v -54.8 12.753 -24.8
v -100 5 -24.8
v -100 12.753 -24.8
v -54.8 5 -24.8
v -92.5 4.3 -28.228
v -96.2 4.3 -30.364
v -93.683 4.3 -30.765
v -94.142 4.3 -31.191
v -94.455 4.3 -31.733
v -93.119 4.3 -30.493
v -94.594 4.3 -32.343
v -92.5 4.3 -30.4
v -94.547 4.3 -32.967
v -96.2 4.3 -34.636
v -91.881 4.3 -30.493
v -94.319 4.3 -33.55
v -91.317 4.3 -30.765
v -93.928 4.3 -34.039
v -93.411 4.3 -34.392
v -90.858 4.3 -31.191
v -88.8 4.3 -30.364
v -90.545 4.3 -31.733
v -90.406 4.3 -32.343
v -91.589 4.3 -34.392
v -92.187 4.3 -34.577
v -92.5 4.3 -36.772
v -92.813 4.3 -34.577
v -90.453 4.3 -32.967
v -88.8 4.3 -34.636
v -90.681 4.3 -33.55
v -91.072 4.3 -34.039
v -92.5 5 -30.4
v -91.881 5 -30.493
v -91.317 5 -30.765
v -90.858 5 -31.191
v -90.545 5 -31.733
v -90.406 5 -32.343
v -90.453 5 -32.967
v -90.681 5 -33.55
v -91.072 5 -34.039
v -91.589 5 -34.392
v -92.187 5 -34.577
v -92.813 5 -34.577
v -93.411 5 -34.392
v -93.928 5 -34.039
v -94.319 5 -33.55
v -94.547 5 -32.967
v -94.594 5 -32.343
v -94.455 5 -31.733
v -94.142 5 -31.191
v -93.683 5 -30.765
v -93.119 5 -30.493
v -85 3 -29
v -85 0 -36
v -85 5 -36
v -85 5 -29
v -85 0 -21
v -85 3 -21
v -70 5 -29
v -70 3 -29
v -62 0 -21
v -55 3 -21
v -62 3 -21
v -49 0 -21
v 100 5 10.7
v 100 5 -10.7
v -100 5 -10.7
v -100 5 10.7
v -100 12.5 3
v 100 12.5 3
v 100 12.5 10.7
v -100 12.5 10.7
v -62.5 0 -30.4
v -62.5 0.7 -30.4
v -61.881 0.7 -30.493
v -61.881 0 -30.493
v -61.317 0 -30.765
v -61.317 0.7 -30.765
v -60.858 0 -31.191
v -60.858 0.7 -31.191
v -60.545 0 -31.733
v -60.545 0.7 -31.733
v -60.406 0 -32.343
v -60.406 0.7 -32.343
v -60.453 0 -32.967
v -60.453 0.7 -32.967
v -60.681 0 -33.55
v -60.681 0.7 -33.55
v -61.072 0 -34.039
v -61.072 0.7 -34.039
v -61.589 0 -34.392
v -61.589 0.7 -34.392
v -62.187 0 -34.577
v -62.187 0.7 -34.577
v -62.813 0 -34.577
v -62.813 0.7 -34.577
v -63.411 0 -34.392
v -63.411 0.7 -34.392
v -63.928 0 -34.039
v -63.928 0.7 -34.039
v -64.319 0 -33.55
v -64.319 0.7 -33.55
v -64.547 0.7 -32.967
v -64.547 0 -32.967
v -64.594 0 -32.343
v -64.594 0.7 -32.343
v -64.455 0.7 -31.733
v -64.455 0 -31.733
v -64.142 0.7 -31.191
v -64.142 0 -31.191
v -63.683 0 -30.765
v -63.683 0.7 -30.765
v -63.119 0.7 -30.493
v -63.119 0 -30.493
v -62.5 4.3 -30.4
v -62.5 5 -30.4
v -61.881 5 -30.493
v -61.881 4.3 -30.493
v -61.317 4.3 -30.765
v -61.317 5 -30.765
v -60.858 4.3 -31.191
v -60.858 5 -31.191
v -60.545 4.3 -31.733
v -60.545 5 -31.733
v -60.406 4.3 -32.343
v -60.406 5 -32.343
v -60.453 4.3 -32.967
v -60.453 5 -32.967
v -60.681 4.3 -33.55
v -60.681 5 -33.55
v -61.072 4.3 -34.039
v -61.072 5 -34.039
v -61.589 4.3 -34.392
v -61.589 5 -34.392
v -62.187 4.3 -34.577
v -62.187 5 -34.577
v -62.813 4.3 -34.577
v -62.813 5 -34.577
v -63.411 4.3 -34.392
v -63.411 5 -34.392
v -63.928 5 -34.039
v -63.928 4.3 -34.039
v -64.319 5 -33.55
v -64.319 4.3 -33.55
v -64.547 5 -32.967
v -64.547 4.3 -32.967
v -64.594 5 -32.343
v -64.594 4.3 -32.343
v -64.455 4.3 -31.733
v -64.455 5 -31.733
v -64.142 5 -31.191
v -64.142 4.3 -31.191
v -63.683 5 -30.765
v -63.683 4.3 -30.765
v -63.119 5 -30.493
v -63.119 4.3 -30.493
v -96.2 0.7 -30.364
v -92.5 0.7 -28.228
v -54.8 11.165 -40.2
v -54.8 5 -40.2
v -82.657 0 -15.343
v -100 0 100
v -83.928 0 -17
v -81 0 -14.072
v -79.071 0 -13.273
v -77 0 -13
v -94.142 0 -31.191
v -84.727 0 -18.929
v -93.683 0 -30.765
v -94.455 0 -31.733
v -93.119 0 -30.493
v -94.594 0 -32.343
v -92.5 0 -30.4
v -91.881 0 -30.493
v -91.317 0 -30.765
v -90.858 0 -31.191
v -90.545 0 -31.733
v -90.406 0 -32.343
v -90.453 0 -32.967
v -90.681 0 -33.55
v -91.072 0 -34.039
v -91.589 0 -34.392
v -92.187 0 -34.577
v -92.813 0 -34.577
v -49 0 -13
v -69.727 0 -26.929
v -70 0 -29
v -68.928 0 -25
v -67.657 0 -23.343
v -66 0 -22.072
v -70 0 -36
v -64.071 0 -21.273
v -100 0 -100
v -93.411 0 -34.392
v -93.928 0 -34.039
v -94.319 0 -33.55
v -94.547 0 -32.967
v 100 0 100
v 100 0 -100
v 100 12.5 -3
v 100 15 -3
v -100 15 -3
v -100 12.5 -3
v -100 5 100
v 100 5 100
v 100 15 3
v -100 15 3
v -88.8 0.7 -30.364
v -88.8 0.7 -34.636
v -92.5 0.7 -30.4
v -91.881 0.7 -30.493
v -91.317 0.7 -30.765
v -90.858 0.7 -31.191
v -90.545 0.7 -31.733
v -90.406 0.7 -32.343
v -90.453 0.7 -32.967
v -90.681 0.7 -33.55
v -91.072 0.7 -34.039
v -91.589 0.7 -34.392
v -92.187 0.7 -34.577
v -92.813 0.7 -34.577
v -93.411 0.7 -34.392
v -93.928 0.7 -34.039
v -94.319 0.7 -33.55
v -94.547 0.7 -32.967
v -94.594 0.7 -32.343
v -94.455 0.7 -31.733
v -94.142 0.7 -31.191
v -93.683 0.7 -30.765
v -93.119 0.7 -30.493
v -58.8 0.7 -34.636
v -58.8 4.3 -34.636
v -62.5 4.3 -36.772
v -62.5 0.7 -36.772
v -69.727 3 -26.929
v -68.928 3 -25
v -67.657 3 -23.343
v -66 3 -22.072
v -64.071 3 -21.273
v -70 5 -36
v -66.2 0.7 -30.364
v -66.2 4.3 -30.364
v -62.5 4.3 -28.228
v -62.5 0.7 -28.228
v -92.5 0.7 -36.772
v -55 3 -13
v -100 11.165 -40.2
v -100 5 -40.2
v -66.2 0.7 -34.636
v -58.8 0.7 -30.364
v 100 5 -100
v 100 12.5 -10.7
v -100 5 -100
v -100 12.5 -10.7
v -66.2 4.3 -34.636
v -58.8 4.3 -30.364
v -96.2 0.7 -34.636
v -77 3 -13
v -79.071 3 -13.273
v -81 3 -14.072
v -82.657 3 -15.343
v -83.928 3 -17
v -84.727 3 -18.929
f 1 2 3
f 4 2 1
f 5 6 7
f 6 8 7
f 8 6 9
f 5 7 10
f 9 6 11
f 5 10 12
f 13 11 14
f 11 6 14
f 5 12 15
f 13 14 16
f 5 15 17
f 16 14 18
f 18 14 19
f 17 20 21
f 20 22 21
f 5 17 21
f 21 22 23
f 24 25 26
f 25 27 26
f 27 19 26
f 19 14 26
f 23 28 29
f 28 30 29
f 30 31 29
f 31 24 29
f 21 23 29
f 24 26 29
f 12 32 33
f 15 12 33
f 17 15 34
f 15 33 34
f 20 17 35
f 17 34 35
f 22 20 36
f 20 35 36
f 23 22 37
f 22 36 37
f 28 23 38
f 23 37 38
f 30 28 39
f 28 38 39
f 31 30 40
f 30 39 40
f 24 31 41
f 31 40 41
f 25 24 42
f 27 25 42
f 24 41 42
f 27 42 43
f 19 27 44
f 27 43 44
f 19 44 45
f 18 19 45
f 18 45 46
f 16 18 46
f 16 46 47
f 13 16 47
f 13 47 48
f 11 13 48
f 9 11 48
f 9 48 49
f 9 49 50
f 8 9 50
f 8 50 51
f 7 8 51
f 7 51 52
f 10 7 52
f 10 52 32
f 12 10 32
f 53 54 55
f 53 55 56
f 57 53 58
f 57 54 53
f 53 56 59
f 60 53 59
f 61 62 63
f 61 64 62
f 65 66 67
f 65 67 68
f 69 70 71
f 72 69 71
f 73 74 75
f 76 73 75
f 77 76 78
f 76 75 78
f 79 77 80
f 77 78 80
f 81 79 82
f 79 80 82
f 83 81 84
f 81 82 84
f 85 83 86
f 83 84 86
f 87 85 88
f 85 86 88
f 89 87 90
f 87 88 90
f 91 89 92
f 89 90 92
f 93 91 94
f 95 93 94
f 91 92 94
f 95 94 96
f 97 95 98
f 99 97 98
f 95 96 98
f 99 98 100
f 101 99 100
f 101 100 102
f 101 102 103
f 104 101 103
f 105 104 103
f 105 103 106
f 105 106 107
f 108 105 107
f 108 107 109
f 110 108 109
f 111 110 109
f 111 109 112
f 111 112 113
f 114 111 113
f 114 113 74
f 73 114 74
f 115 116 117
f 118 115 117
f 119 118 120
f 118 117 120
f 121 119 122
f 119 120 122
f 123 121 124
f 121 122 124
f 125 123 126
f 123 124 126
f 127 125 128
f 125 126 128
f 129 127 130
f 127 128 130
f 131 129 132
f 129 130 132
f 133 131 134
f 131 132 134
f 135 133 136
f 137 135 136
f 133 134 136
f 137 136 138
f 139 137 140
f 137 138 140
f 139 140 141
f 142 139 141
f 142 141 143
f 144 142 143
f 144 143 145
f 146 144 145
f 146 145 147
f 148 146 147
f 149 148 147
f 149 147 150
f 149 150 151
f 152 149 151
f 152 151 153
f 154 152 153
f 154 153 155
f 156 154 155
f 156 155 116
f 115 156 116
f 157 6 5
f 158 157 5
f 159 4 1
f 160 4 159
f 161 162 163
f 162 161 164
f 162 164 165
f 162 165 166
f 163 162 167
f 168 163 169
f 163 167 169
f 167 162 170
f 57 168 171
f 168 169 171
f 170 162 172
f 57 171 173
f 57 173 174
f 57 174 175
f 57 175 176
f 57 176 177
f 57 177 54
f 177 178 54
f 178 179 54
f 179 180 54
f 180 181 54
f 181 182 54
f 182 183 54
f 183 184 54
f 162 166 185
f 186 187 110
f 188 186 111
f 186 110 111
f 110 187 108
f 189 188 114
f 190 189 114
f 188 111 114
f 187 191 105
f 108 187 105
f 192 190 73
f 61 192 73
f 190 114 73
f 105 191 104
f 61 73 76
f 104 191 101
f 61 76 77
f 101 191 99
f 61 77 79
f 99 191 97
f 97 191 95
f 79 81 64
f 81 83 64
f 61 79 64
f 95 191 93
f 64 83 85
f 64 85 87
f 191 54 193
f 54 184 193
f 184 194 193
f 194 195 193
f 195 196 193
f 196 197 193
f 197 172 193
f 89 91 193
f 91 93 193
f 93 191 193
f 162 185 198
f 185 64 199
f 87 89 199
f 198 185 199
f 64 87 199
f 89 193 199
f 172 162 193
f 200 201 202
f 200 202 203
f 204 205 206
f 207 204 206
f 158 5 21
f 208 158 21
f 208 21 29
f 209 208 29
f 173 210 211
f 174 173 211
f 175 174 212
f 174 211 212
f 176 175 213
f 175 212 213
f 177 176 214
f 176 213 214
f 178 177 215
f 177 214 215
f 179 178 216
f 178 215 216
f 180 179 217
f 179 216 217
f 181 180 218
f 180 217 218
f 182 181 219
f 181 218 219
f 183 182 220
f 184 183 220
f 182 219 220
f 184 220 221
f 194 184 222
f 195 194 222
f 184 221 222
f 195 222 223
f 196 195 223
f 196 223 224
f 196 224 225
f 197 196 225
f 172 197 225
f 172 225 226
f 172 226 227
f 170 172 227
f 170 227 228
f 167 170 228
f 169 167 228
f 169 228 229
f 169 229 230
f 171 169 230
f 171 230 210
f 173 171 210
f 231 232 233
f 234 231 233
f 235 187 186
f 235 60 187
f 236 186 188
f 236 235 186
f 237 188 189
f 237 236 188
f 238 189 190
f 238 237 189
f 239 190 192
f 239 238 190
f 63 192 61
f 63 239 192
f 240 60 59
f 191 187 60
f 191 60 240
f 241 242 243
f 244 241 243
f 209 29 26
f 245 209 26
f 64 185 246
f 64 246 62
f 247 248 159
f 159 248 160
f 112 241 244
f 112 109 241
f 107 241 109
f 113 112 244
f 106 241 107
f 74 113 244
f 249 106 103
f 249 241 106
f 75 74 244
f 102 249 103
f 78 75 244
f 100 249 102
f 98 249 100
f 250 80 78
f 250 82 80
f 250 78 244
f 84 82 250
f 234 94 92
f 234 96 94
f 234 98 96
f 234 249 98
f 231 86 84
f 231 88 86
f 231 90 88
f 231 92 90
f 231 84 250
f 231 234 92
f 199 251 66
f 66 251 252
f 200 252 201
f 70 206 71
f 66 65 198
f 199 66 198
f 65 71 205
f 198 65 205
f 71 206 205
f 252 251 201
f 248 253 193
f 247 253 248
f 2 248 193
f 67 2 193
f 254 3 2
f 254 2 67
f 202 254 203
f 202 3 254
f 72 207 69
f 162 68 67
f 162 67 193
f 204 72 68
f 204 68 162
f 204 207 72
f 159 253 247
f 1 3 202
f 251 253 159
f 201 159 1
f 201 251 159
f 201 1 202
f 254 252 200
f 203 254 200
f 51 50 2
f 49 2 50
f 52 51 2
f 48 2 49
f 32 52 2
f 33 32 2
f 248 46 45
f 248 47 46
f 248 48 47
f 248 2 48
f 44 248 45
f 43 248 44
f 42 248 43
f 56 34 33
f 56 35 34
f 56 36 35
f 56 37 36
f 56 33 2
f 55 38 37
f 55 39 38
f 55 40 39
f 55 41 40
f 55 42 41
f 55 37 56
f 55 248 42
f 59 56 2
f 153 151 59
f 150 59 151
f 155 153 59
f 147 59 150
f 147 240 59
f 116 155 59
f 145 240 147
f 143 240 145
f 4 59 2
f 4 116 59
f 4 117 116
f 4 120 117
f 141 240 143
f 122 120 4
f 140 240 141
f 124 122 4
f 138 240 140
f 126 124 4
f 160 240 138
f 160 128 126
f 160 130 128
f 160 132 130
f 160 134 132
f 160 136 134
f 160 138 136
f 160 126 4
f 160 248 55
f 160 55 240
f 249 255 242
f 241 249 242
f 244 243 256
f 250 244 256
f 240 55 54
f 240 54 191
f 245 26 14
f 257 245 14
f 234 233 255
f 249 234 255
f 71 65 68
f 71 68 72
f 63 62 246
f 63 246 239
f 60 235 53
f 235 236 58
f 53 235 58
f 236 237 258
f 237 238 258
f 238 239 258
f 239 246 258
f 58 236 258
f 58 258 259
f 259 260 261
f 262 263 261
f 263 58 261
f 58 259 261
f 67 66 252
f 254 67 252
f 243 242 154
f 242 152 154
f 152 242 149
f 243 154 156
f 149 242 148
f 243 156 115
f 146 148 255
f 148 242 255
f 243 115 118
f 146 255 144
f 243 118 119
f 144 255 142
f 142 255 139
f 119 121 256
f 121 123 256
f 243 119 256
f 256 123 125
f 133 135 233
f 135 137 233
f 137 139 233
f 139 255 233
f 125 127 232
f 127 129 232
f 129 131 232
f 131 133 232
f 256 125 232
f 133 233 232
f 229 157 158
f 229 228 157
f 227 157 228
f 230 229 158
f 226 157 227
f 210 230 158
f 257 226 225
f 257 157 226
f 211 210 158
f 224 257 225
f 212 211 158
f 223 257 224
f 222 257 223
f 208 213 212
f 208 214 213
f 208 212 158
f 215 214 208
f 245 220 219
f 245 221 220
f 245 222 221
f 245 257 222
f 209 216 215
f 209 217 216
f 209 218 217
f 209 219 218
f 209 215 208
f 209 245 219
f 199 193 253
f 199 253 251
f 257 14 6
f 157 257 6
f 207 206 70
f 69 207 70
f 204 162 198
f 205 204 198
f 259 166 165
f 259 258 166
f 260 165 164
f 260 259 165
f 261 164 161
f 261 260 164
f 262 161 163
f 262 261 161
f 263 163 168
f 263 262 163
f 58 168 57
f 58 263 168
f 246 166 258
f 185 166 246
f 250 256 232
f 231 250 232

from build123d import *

# Parameters (mm, degrees)
SKETCH1_W           = 200
SKETCH1_H           = 200
BOSS_EXTRUDE1_DEPTH = 5
SKETCH8_W           = 15
SKETCH8_H           = 7
CUT_EXTRUDE4_DEPTH  = 142.509716981
BOSS_EXTRUDE2_DEPTH = 200
CUT_EXTRUDE6_REACH  = 143.774
SKETCH10_W          = 45.2
SKETCH10_H          = 15.4
CUT_EXTRUDE7_START  = -0.7
CUT_EXTRUDE7_DEPTH  = 3.6
SKETCH12_R          = 2.1
CUT_EXTRUDE8_DEPTH  = 142.774468788
CUT_EXTRUDE9_START  = -200
SKETCH13_W          = 21.4
SKETCH13_H          = 7.5
CUT_EXTRUDE9_DEPTH  = 200
CUT_EXTRUDE12_DEPTH = 3
FILLET1_R           = 8
CHAMFER1_SIZE2      = 6
CHAMFER1_SIZE       = 3


with BuildPart() as part:
    # Sketch1 → Boss-Extrude1 (new body)
    with BuildSketch(Plane(origin=(0, 0, 0), x_dir=(1, 0, 0), z_dir=(0, 1, 0))):
        Rectangle(SKETCH1_W, SKETCH1_H)
    extrude(amount=BOSS_EXTRUDE1_DEPTH)

    # Sketch8 → Cut-Extrude4 (cut, through all)
    with BuildSketch(Plane(origin=(0, 5, 0), x_dir=(1, 0, 0), z_dir=(0, 1, 0))):
        with Locations((-77.5, 32.5)):
            Rectangle(SKETCH8_W, SKETCH8_H)
    extrude(amount=-CUT_EXTRUDE4_DEPTH, mode=Mode.SUBTRACT)

    # Sketch9 → Boss-Extrude2 (add)
    with BuildSketch(Plane(origin=(100, 0, 0), x_dir=(0, 0, -1), z_dir=(1, 0, 0))):
        Polygon((-100, 5), (-3, 15), (-3, 5), align=None)
        Polygon((3, 5), (100, 5), (3, 15), align=None)
    extrude(amount=-BOSS_EXTRUDE2_DEPTH)

    # Cut-Extrude6: up to this plane
    cut_extrude6_end = Plane(origin=(-197.514101544, 5, -100), z_dir=(0, 0.9947279261542806, -0.1025492707375547))
    # Sketch10 → Cut-Extrude6 (cut, up to the surface)
    with BuildSketch(Plane(origin=(0, 5, 0), x_dir=(1, 0, 0), z_dir=(0, 1, 0)), mode=Mode.PRIVATE) as cut_extrude6_sk1:
        with Locations((-77.4, 32.5)):
            Rectangle(SKETCH10_W, SKETCH10_H)
    cut_extrude6_tool1 = split(extrude(cut_extrude6_sk1.sketch, amount=CUT_EXTRUDE6_REACH, mode=Mode.PRIVATE), bisect_by=cut_extrude6_end, keep=Keep.BOTH, mode=Mode.PRIVATE)
    add(cut_extrude6_tool1.solids().sort_by_distance((-77.4, 5, -32.5))[0], mode=Mode.SUBTRACT)

    # Sketch11 → Cut-Extrude7 (cut)
    with BuildSketch(Plane(origin=(0, 5, 0), x_dir=(1, 0, 0), z_dir=(0, 1, 0)).offset(CUT_EXTRUDE7_START)):
        Polygon((-92.5, 36.772391992), (-96.2, 34.636195996), (-96.2, 30.363804004), (-92.5, 28.227608008), (-88.8, 30.363804004), (-88.8, 34.636195996), align=None)
        Polygon((-62.5, 36.772391992), (-66.2, 34.636195996), (-66.2, 30.363804004), (-62.5, 28.227608008), (-58.8, 30.363804004), (-58.8, 34.636195996), align=None)
    extrude(amount=-CUT_EXTRUDE7_DEPTH, mode=Mode.SUBTRACT)

    # Sketch12 → Cut-Extrude8 (cut, through all)
    with BuildSketch(Plane(origin=(0, 5, 0), x_dir=(1, 0, 0), z_dir=(0, 1, 0))):
        with Locations(Location((-92.5, 32.5, 0), (0, 0, 270))):
            Circle(SKETCH12_R)
        with Locations(Location((-62.5, 32.5, 0), (0, 0, 270))):
            Circle(SKETCH12_R)
    extrude(amount=-CUT_EXTRUDE8_DEPTH, mode=Mode.SUBTRACT)

    # Sketch13 → Cut-Extrude9 (cut)
    with BuildSketch(Plane.ZY.offset(100).offset(CUT_EXTRUDE9_START)):
        with Locations((0, 8.75)):
            Rectangle(SKETCH13_W, SKETCH13_H)
    extrude(amount=CUT_EXTRUDE9_DEPTH, mode=Mode.SUBTRACT)

    # Sketch16 → Cut-Extrude12 (cut)
    with BuildSketch(Plane.XZ):
        Polygon((-85, -29), (-85, -13), (-55, -13), (-55, -21), (-70, -21), (-70, -29), align=None)
    extrude(amount=-CUT_EXTRUDE12_DEPTH, mode=Mode.SUBTRACT)

    # Fillet1
    fillet1_edges = [part.edges().sort_by_distance(p)[0] for p in [
        (-70, 1.5, -21),
        (-85, 1.5, -13),
    ]]
    fillet(fillet1_edges, radius=FILLET1_R)

    # Chamfer1
    chamfer1_edges = [part.edges().sort_by_distance(p)[0] for p in [
        (-55, 0, -17),
    ]]
    chamfer1_side = [part.faces().sort_by_distance(p)[0] for p in [
        (-55, 0.06, -17),
    ]]
    chamfer(chamfer1_edges, length=CHAMFER1_SIZE - 0.0001, length2=CHAMFER1_SIZE2 - 0.0001, reference=chamfer1_side[0])  # a hair under: the kernel refuses the full size


solid = part.part
